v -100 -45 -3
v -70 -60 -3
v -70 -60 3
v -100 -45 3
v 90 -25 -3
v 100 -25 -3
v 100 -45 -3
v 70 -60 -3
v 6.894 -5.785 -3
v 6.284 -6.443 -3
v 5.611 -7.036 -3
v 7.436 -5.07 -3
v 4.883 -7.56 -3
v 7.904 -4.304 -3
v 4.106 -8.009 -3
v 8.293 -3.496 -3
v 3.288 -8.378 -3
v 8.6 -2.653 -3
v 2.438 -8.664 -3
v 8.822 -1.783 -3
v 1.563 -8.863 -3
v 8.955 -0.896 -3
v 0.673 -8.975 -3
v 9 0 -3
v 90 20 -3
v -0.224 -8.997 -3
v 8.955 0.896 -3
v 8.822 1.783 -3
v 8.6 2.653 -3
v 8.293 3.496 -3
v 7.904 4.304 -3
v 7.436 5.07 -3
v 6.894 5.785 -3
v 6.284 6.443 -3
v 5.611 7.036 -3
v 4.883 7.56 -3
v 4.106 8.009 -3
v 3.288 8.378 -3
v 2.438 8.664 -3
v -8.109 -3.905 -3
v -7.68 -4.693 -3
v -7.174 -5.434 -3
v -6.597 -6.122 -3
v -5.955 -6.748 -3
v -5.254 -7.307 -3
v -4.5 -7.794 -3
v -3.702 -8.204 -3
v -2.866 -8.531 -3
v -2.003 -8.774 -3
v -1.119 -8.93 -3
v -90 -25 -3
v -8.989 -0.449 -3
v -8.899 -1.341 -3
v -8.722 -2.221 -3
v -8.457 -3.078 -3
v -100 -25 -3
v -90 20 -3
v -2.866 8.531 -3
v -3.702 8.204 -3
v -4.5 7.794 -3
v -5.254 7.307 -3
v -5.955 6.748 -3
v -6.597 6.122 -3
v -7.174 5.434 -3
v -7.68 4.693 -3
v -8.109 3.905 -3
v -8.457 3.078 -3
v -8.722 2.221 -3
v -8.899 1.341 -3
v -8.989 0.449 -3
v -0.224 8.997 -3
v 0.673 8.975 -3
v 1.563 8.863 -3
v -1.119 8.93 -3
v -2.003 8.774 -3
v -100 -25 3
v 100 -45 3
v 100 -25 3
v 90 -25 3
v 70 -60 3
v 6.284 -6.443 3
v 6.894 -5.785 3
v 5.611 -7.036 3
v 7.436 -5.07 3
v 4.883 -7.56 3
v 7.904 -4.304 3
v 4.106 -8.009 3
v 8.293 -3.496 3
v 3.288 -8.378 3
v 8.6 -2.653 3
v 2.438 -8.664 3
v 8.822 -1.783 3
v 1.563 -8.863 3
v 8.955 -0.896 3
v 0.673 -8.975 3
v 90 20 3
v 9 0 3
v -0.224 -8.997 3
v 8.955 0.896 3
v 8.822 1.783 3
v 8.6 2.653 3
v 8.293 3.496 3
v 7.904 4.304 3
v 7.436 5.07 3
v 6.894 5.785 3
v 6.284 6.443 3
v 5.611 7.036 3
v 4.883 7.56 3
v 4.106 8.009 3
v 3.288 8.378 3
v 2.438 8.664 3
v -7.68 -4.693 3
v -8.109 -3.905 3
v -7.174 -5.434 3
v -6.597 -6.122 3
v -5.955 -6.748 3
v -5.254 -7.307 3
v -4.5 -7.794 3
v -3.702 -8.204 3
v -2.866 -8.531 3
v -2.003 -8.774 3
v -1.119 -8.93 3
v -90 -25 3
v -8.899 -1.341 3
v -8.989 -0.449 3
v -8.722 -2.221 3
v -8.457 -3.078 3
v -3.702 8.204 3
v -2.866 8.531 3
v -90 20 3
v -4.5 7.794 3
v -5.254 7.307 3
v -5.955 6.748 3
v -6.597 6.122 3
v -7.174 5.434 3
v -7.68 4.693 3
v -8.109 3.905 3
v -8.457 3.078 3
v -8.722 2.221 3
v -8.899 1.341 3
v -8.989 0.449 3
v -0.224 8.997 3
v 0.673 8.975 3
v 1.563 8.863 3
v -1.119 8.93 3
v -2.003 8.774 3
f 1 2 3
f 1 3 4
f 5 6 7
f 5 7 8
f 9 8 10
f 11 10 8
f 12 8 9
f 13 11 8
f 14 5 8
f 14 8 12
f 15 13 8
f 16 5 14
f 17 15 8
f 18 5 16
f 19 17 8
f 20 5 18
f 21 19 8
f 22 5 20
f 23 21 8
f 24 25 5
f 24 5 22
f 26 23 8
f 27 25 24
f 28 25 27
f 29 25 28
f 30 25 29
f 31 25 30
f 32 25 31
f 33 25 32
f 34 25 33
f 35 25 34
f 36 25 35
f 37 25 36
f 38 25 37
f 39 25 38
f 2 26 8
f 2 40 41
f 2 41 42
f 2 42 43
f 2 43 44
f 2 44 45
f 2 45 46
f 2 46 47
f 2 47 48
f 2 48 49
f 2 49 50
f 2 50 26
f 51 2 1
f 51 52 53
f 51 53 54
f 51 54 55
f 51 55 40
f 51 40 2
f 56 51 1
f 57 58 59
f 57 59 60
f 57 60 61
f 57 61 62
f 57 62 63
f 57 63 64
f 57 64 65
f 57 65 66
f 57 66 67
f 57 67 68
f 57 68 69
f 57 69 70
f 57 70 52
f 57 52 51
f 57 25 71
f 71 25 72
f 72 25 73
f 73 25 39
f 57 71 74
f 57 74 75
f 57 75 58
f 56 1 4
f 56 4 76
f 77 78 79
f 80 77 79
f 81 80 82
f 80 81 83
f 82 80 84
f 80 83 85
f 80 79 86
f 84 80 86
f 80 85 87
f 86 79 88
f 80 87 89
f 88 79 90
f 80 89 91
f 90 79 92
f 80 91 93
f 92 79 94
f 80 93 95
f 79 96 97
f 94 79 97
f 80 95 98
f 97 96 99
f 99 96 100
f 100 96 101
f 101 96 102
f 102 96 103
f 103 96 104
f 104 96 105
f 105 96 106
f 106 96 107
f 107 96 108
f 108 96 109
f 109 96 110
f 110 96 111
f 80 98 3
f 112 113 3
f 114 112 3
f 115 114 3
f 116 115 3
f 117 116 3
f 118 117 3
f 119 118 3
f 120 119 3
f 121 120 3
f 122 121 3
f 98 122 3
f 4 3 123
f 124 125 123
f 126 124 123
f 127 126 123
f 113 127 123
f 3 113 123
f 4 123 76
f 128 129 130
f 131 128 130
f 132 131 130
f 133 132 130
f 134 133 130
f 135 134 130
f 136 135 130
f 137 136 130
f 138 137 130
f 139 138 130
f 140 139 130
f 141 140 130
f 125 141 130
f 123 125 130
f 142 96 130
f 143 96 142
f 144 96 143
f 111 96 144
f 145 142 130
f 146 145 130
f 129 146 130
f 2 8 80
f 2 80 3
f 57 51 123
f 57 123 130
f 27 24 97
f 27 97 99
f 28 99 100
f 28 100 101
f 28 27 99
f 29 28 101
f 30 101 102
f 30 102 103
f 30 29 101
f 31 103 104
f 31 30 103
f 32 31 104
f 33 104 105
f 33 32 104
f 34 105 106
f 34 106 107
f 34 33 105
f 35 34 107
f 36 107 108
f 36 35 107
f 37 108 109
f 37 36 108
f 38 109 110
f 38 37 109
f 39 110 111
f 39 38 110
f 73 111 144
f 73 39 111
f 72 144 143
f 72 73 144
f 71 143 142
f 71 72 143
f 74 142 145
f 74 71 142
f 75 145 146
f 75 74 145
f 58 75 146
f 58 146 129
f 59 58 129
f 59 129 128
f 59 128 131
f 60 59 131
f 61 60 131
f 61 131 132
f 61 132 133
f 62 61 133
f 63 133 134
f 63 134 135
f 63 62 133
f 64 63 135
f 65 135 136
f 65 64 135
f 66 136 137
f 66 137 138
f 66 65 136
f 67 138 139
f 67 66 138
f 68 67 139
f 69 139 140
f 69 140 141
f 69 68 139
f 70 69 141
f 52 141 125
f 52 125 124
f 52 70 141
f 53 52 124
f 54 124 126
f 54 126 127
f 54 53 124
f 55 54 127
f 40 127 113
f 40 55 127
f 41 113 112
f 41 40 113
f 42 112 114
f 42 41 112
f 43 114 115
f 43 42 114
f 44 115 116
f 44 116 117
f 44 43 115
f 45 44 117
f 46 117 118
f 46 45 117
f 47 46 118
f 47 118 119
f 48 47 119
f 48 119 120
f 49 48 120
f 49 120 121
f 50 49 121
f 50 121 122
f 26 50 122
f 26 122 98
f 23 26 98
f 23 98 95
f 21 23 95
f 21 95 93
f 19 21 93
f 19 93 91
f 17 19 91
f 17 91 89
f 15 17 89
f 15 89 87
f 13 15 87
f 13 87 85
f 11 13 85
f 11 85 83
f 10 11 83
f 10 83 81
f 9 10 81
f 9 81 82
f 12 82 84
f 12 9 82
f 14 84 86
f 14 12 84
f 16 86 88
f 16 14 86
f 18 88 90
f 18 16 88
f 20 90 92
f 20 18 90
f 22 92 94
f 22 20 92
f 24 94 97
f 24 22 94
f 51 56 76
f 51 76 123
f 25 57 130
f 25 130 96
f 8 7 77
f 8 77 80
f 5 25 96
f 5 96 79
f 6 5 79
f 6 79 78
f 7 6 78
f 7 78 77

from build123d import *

# Parameters (mm, degrees)
BOSS_EXTRUDE1_DEPTH      = 3
BOSS_EXTRUDE1_DEPTH_BACK = 3
SKETCH1_R                = 9


with BuildPart() as part:
    # Sketch1 → Boss-Extrude1 (new, two sides: drawn at the far end of the back side and taken through both)
    with BuildSketch(Plane.XY.offset(-BOSS_EXTRUDE1_DEPTH_BACK)):
        Polygon((-90, 20), (90, 20), (90, -25), (100, -25), (100, -45), (70, -60), (-70, -60), (-100, -45), (-100, -25), (-90, -25), align=None)
        Circle(SKETCH1_R, mode=Mode.SUBTRACT)
    extrude(amount=BOSS_EXTRUDE1_DEPTH + BOSS_EXTRUDE1_DEPTH_BACK)


solid = part.part
